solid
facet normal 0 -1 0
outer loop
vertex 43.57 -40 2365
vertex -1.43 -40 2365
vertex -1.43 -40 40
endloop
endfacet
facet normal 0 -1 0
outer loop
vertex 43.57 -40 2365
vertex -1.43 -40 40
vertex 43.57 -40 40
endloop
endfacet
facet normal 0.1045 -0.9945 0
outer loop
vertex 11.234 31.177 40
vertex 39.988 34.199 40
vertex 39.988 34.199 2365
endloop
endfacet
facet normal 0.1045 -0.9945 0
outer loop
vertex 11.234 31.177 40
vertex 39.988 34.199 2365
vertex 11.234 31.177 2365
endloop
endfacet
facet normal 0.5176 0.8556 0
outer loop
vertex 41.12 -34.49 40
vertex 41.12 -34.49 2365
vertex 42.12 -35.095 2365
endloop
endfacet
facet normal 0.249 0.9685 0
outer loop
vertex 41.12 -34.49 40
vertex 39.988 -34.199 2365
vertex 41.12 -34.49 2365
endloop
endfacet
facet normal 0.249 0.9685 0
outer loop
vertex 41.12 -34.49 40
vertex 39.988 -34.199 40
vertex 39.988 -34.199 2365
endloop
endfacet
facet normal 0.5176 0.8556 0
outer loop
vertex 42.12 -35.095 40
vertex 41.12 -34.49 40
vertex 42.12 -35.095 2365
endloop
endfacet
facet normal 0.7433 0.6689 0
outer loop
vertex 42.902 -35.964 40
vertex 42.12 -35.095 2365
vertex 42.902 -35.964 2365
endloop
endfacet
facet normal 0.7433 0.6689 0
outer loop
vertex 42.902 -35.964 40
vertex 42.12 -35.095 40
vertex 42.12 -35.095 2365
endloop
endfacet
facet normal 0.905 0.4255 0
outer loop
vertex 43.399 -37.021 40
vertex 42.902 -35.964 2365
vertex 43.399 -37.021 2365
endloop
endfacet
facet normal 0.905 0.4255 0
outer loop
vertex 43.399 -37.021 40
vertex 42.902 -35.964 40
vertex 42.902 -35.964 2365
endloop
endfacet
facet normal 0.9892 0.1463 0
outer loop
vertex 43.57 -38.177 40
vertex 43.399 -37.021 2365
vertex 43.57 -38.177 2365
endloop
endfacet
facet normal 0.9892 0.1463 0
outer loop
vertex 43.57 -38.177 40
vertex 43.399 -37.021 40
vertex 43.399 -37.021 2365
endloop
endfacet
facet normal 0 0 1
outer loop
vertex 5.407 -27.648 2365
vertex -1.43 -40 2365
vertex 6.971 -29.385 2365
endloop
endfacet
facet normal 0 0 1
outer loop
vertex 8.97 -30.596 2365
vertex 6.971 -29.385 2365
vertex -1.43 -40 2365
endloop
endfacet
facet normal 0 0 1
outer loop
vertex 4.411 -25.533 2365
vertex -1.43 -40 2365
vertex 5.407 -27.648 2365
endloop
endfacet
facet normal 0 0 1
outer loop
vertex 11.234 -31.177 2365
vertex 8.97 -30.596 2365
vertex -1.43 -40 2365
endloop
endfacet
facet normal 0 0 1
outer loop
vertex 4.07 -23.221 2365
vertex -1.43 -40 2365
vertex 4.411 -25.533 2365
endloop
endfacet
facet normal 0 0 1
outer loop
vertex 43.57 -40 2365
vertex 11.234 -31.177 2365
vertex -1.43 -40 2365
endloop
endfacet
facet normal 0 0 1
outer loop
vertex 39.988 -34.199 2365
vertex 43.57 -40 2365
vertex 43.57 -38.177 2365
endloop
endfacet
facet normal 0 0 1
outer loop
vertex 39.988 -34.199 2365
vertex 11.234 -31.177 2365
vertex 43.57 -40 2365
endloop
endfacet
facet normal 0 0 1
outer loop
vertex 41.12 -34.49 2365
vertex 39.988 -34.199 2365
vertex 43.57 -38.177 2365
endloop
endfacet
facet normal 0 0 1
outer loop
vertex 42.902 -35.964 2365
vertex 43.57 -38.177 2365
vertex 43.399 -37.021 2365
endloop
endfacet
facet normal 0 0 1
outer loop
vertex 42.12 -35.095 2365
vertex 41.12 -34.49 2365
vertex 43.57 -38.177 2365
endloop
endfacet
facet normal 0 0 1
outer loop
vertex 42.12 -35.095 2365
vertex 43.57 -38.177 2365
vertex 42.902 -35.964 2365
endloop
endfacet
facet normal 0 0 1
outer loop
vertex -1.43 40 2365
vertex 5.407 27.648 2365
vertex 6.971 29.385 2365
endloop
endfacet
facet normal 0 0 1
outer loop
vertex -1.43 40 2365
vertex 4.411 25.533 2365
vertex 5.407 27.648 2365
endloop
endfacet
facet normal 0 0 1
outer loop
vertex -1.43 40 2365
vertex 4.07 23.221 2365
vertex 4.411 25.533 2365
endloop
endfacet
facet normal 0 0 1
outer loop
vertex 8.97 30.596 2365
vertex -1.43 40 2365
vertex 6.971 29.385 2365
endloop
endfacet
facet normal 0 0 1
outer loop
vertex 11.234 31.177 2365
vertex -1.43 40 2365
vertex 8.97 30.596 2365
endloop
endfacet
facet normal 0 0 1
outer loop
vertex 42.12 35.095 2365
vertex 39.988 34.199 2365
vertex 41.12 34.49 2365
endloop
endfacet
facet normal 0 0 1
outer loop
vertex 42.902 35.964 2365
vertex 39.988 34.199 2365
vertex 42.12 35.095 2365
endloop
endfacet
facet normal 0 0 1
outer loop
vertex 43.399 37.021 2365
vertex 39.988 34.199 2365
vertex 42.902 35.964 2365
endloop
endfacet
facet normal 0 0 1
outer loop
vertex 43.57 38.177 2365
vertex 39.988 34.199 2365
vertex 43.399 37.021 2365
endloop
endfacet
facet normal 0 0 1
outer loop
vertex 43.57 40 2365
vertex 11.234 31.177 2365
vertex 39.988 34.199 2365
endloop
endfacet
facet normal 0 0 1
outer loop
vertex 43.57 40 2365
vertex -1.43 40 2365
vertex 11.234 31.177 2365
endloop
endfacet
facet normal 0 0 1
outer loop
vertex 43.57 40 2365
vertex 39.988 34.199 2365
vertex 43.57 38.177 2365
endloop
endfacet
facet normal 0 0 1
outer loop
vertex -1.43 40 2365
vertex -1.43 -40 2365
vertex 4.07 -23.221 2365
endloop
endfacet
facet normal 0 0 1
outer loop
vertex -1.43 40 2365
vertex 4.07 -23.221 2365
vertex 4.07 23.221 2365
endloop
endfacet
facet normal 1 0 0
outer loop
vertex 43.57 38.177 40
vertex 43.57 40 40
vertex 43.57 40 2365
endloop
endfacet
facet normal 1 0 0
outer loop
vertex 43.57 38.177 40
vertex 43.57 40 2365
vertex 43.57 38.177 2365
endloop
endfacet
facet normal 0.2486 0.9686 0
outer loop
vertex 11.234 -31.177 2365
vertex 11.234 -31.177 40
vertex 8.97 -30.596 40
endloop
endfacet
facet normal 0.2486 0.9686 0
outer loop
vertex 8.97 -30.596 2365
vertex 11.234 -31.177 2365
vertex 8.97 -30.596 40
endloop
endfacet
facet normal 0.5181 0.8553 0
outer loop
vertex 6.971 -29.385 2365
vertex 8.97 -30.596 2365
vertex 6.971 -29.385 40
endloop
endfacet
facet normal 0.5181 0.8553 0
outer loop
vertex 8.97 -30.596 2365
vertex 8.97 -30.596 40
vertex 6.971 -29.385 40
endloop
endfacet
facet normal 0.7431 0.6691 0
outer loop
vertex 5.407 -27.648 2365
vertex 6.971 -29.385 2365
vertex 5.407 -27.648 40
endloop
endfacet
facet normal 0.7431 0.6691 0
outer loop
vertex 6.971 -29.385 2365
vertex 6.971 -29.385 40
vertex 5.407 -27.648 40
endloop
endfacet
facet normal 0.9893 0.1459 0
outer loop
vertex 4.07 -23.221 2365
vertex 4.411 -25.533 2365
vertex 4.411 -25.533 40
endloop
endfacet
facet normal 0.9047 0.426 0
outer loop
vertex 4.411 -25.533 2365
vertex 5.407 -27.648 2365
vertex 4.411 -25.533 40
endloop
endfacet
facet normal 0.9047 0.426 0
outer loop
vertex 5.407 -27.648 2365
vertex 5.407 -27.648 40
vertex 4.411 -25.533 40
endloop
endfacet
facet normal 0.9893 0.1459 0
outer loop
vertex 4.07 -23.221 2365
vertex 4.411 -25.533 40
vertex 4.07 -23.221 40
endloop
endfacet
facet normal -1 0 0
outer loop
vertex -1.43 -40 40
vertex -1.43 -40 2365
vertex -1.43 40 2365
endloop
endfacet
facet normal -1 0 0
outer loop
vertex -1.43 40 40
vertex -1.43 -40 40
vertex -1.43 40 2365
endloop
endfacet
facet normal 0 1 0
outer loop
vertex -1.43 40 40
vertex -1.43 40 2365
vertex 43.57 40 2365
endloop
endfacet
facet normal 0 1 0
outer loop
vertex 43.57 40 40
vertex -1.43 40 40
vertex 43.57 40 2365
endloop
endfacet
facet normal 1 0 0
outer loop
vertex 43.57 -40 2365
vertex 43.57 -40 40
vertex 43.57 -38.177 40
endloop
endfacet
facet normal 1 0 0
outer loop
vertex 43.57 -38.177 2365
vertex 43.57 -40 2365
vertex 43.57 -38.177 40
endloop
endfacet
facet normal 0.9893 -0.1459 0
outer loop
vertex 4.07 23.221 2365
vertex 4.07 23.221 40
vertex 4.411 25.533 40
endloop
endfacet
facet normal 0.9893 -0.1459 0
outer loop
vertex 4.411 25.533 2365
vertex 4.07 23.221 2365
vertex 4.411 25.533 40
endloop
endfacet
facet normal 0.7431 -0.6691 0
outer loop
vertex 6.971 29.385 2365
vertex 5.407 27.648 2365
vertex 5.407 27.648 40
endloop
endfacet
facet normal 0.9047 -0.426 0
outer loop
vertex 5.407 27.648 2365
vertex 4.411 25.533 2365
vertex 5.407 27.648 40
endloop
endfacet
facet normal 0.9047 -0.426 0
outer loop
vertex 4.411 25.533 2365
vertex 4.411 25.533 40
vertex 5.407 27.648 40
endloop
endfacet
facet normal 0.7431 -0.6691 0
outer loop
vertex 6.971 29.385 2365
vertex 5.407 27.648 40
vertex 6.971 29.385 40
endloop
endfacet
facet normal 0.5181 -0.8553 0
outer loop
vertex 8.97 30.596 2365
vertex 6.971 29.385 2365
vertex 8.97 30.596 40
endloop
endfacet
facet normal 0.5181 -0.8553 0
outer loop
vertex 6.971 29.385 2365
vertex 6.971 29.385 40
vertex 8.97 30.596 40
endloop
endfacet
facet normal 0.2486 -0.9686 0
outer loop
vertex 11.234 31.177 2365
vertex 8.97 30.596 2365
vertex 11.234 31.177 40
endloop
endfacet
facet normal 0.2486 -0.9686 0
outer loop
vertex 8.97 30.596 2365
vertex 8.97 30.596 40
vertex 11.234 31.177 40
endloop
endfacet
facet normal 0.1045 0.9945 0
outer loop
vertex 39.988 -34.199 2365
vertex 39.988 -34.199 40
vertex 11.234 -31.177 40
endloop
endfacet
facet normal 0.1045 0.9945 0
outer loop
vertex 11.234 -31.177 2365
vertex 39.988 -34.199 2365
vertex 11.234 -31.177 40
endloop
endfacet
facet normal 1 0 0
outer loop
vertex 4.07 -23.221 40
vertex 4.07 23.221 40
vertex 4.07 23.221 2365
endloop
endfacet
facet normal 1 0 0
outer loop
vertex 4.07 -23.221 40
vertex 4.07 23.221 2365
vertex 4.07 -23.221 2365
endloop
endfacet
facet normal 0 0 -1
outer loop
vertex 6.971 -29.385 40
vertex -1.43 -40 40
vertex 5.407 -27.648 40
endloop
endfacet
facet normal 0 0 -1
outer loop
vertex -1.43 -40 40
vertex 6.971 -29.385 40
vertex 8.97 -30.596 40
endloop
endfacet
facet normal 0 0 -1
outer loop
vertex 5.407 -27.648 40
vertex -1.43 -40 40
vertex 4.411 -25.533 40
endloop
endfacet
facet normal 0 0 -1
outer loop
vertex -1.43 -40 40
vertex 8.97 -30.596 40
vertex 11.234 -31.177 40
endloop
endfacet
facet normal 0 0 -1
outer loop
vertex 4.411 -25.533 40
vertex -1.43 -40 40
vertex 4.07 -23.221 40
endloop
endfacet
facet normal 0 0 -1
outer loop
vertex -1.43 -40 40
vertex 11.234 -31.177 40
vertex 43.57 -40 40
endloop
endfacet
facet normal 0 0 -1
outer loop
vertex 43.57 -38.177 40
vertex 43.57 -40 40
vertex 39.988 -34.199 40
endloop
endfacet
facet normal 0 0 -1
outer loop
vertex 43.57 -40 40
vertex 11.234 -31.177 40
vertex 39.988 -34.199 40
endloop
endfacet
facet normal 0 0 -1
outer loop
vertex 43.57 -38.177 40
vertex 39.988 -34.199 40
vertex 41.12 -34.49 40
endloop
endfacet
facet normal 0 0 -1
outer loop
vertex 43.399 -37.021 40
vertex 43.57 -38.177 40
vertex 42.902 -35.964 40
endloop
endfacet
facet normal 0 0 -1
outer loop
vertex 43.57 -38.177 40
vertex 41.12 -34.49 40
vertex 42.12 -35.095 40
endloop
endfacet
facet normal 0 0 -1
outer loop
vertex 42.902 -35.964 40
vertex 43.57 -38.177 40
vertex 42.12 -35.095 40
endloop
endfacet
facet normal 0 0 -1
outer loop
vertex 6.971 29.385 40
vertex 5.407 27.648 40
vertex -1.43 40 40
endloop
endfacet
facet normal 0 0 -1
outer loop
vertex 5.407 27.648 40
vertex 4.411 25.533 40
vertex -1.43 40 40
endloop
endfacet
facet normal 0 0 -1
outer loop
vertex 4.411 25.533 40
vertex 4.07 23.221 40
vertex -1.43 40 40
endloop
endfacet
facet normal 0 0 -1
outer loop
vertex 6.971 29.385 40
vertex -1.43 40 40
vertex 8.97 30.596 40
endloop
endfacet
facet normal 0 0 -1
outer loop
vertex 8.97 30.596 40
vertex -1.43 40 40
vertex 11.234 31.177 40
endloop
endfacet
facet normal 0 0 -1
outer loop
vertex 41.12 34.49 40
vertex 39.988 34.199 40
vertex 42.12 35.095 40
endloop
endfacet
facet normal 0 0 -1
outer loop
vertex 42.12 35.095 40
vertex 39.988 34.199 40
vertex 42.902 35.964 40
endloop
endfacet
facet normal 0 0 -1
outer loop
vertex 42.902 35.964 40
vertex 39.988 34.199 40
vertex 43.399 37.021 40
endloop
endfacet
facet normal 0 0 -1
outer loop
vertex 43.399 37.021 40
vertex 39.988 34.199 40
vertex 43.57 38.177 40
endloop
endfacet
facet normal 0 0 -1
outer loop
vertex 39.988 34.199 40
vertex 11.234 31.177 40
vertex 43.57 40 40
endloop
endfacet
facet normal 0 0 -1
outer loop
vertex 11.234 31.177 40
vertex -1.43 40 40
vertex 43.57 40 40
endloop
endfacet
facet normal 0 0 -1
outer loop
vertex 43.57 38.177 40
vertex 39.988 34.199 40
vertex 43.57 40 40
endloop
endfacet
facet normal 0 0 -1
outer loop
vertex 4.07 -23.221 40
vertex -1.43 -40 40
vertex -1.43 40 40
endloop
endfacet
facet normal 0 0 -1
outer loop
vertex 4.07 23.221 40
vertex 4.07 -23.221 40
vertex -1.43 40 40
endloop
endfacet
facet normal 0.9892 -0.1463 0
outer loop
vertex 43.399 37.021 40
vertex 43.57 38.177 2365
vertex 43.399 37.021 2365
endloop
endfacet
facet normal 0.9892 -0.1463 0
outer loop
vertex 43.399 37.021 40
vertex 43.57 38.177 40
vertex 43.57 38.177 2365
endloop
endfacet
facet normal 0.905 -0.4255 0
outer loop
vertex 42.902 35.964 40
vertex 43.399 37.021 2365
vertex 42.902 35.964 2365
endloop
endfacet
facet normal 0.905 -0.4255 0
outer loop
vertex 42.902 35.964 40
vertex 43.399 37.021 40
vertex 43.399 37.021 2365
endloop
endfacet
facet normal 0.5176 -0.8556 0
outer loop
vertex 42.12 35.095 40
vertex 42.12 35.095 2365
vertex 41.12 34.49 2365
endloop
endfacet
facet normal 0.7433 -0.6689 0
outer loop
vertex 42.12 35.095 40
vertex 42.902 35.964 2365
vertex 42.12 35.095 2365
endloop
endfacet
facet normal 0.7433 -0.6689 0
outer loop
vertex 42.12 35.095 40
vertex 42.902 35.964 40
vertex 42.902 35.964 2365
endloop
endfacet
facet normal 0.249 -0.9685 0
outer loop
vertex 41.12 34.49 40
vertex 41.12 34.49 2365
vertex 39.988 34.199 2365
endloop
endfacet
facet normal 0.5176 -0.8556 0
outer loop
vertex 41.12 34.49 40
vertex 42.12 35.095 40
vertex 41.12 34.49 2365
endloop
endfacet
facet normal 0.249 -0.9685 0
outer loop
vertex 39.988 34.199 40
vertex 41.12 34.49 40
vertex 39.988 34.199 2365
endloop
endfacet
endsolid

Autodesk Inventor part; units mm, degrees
ref_plane "Начальная плоскость" through (0, 0, 40) normal (0, 0, 1) x (1, 0, 0)
ref_plane "Конечная плоскость" through (0, 0, 2365) normal (0, 0, 1) x (1, 0, 0)
sketch "Эскиз" plane through (0, 0, 0) normal (0, 0, 1) x (1, 0, 0)
  line L0 (-1.43, 0) -> (-1.43, 40)
  line L1 (-1.43, 40) -> (43.57, 40)
  line L2 (43.57, 40) -> (43.57, 38.1774)
  line L3 (39.9881, 34.1993) -> (11.2338, 31.1771)
  line L4 (4.07, 23.221) -> (4.07, 0)
  line L5 (4.07, 0) -> (-1.43, 0) construction
  line L6 (23.82, 40) -> (23.82, 32.5) construction
  line L7 (43.57, 34.5758) -> (43.57, 32.5) construction
  line L8 (43.57, 32.5) -> (23.82, 32.5) construction
  line L9 (0, 15) -> (0, -27) construction
  line L10 (-5.539, 0) -> (16.0067, 0) construction
  line L11 (-1.43, 0) -> (-1.43, -40)
  line L12 (-1.43, -40) -> (43.57, -40)
  line L13 (43.57, -40) -> (43.57, -38.1774)
  line L14 (39.9881, -34.1993) -> (11.2338, -31.1771)
  line L15 (4.07, -23.221) -> (4.07, 0)
  arc A0 (11.2338, 31.1771) -> (4.07, 23.221) centre (12.07, 23.221) ccw
  arc A1 (4.07, -23.221) -> (11.2338, -31.1771) centre (12.07, -23.221) ccw
  arc A2 (39.9881, 34.1993) -> (43.57, 38.1774) centre (39.57, 38.1774) ccw
  arc A3 (43.57, -38.1774) -> (39.9881, -34.1993) centre (39.57, -38.1774) ccw
  line L16 (0, 56) -> (0, -56) construction
  line L17 (-15.5135, 0) -> (54.308, 0) construction
  point P0 (4.07, 30.4242)
  point P1 (43.57, -34.5758)
  point P2 (4.07, -30.4242)
  point P3 (23.82, -40)
  point P4 (23.82, -32.5)
  dimension "d0" = 5.5
  dimension "d1" = 40
  dimension "d2" = 45
  dimension "d3" = 7.5
  dimension "d4" = 19.75
  dimension "d5" = 2.0758
  dimension "d23" = 8
  dimension "d24" = 4
  dimension "d25" = 1.43
extrude "Тело" add sketch "Эскиз" along normal up to surface (2325 mm away) from surface at 40
sketch "Sketch3" plane through (0, 0, 0) normal (0, 0, 1) x (1, 0, 0)
  line L0 (0, 0) -> (10, 0)
ref_plane "Work Plane3" through (0, 0, 0) normal (0, -1, 0) x (1, 0, 0)
sketch "Sketch4" plane through (0, 0, 0) normal (0, -1, 0) x (1, 0, 0)
  line L0 (-2, 40) -> (12, 40)
  line L1 (-2, 2365) -> (12, 2365)
  dimension "d29" = 2325
ref_plane "РабПлоскость4" through (-1.43, 1200, 40) normal (0, 0, -1) x (-1, 0, 0)
split "Разделение1" plane through (-1.43, 1200, 40) removes the side toward (0, 0, -1)
ref_plane "РабПлоскость5" through (-1.43, -520, 2365) normal (0, 0, 1) x (1, 0, 0)
split "Разделение2" plane through (-1.43, -520, 2365) removes the side toward (0, 0, 1)
equation "\"d0\" = G_T"
equation "\"d1\" = 0.5 * G_H"
equation "\"d2\" = G_W"
equation "\"d3\" = G_T1"
equation "\"d4\" = G_C"
equation "\"d23\" = G_IR"
equation "\"d24\" = G_ER"
equation "\"d25\" = ex"
equation "\"d6\" = G_L"
equation "\"G_W\" = 45"
equation "\"G_T\" = 5.5"
equation "\"G_T1\" = 7.5"
equation "\"G_NG\" = 0.105104"
equation "\"G_ER\" = 4"
equation "\"G_IR\" = 8"
equation "\"G_C\" = 19.75"
equation "\"G_L\" = d29"
equation "\"ex\" = 1.43"
equation "\"d27\" = G_OFFSET_END + B_L"
equation "\"B_L\" = 2405"
equation "\"G_H\" = 80"
equation "\"G_OFFSET_END\" = -40"
properties part number "ISO 657/11 - CH 80 x 8 - 2325" material "Сталь, мягкая"
